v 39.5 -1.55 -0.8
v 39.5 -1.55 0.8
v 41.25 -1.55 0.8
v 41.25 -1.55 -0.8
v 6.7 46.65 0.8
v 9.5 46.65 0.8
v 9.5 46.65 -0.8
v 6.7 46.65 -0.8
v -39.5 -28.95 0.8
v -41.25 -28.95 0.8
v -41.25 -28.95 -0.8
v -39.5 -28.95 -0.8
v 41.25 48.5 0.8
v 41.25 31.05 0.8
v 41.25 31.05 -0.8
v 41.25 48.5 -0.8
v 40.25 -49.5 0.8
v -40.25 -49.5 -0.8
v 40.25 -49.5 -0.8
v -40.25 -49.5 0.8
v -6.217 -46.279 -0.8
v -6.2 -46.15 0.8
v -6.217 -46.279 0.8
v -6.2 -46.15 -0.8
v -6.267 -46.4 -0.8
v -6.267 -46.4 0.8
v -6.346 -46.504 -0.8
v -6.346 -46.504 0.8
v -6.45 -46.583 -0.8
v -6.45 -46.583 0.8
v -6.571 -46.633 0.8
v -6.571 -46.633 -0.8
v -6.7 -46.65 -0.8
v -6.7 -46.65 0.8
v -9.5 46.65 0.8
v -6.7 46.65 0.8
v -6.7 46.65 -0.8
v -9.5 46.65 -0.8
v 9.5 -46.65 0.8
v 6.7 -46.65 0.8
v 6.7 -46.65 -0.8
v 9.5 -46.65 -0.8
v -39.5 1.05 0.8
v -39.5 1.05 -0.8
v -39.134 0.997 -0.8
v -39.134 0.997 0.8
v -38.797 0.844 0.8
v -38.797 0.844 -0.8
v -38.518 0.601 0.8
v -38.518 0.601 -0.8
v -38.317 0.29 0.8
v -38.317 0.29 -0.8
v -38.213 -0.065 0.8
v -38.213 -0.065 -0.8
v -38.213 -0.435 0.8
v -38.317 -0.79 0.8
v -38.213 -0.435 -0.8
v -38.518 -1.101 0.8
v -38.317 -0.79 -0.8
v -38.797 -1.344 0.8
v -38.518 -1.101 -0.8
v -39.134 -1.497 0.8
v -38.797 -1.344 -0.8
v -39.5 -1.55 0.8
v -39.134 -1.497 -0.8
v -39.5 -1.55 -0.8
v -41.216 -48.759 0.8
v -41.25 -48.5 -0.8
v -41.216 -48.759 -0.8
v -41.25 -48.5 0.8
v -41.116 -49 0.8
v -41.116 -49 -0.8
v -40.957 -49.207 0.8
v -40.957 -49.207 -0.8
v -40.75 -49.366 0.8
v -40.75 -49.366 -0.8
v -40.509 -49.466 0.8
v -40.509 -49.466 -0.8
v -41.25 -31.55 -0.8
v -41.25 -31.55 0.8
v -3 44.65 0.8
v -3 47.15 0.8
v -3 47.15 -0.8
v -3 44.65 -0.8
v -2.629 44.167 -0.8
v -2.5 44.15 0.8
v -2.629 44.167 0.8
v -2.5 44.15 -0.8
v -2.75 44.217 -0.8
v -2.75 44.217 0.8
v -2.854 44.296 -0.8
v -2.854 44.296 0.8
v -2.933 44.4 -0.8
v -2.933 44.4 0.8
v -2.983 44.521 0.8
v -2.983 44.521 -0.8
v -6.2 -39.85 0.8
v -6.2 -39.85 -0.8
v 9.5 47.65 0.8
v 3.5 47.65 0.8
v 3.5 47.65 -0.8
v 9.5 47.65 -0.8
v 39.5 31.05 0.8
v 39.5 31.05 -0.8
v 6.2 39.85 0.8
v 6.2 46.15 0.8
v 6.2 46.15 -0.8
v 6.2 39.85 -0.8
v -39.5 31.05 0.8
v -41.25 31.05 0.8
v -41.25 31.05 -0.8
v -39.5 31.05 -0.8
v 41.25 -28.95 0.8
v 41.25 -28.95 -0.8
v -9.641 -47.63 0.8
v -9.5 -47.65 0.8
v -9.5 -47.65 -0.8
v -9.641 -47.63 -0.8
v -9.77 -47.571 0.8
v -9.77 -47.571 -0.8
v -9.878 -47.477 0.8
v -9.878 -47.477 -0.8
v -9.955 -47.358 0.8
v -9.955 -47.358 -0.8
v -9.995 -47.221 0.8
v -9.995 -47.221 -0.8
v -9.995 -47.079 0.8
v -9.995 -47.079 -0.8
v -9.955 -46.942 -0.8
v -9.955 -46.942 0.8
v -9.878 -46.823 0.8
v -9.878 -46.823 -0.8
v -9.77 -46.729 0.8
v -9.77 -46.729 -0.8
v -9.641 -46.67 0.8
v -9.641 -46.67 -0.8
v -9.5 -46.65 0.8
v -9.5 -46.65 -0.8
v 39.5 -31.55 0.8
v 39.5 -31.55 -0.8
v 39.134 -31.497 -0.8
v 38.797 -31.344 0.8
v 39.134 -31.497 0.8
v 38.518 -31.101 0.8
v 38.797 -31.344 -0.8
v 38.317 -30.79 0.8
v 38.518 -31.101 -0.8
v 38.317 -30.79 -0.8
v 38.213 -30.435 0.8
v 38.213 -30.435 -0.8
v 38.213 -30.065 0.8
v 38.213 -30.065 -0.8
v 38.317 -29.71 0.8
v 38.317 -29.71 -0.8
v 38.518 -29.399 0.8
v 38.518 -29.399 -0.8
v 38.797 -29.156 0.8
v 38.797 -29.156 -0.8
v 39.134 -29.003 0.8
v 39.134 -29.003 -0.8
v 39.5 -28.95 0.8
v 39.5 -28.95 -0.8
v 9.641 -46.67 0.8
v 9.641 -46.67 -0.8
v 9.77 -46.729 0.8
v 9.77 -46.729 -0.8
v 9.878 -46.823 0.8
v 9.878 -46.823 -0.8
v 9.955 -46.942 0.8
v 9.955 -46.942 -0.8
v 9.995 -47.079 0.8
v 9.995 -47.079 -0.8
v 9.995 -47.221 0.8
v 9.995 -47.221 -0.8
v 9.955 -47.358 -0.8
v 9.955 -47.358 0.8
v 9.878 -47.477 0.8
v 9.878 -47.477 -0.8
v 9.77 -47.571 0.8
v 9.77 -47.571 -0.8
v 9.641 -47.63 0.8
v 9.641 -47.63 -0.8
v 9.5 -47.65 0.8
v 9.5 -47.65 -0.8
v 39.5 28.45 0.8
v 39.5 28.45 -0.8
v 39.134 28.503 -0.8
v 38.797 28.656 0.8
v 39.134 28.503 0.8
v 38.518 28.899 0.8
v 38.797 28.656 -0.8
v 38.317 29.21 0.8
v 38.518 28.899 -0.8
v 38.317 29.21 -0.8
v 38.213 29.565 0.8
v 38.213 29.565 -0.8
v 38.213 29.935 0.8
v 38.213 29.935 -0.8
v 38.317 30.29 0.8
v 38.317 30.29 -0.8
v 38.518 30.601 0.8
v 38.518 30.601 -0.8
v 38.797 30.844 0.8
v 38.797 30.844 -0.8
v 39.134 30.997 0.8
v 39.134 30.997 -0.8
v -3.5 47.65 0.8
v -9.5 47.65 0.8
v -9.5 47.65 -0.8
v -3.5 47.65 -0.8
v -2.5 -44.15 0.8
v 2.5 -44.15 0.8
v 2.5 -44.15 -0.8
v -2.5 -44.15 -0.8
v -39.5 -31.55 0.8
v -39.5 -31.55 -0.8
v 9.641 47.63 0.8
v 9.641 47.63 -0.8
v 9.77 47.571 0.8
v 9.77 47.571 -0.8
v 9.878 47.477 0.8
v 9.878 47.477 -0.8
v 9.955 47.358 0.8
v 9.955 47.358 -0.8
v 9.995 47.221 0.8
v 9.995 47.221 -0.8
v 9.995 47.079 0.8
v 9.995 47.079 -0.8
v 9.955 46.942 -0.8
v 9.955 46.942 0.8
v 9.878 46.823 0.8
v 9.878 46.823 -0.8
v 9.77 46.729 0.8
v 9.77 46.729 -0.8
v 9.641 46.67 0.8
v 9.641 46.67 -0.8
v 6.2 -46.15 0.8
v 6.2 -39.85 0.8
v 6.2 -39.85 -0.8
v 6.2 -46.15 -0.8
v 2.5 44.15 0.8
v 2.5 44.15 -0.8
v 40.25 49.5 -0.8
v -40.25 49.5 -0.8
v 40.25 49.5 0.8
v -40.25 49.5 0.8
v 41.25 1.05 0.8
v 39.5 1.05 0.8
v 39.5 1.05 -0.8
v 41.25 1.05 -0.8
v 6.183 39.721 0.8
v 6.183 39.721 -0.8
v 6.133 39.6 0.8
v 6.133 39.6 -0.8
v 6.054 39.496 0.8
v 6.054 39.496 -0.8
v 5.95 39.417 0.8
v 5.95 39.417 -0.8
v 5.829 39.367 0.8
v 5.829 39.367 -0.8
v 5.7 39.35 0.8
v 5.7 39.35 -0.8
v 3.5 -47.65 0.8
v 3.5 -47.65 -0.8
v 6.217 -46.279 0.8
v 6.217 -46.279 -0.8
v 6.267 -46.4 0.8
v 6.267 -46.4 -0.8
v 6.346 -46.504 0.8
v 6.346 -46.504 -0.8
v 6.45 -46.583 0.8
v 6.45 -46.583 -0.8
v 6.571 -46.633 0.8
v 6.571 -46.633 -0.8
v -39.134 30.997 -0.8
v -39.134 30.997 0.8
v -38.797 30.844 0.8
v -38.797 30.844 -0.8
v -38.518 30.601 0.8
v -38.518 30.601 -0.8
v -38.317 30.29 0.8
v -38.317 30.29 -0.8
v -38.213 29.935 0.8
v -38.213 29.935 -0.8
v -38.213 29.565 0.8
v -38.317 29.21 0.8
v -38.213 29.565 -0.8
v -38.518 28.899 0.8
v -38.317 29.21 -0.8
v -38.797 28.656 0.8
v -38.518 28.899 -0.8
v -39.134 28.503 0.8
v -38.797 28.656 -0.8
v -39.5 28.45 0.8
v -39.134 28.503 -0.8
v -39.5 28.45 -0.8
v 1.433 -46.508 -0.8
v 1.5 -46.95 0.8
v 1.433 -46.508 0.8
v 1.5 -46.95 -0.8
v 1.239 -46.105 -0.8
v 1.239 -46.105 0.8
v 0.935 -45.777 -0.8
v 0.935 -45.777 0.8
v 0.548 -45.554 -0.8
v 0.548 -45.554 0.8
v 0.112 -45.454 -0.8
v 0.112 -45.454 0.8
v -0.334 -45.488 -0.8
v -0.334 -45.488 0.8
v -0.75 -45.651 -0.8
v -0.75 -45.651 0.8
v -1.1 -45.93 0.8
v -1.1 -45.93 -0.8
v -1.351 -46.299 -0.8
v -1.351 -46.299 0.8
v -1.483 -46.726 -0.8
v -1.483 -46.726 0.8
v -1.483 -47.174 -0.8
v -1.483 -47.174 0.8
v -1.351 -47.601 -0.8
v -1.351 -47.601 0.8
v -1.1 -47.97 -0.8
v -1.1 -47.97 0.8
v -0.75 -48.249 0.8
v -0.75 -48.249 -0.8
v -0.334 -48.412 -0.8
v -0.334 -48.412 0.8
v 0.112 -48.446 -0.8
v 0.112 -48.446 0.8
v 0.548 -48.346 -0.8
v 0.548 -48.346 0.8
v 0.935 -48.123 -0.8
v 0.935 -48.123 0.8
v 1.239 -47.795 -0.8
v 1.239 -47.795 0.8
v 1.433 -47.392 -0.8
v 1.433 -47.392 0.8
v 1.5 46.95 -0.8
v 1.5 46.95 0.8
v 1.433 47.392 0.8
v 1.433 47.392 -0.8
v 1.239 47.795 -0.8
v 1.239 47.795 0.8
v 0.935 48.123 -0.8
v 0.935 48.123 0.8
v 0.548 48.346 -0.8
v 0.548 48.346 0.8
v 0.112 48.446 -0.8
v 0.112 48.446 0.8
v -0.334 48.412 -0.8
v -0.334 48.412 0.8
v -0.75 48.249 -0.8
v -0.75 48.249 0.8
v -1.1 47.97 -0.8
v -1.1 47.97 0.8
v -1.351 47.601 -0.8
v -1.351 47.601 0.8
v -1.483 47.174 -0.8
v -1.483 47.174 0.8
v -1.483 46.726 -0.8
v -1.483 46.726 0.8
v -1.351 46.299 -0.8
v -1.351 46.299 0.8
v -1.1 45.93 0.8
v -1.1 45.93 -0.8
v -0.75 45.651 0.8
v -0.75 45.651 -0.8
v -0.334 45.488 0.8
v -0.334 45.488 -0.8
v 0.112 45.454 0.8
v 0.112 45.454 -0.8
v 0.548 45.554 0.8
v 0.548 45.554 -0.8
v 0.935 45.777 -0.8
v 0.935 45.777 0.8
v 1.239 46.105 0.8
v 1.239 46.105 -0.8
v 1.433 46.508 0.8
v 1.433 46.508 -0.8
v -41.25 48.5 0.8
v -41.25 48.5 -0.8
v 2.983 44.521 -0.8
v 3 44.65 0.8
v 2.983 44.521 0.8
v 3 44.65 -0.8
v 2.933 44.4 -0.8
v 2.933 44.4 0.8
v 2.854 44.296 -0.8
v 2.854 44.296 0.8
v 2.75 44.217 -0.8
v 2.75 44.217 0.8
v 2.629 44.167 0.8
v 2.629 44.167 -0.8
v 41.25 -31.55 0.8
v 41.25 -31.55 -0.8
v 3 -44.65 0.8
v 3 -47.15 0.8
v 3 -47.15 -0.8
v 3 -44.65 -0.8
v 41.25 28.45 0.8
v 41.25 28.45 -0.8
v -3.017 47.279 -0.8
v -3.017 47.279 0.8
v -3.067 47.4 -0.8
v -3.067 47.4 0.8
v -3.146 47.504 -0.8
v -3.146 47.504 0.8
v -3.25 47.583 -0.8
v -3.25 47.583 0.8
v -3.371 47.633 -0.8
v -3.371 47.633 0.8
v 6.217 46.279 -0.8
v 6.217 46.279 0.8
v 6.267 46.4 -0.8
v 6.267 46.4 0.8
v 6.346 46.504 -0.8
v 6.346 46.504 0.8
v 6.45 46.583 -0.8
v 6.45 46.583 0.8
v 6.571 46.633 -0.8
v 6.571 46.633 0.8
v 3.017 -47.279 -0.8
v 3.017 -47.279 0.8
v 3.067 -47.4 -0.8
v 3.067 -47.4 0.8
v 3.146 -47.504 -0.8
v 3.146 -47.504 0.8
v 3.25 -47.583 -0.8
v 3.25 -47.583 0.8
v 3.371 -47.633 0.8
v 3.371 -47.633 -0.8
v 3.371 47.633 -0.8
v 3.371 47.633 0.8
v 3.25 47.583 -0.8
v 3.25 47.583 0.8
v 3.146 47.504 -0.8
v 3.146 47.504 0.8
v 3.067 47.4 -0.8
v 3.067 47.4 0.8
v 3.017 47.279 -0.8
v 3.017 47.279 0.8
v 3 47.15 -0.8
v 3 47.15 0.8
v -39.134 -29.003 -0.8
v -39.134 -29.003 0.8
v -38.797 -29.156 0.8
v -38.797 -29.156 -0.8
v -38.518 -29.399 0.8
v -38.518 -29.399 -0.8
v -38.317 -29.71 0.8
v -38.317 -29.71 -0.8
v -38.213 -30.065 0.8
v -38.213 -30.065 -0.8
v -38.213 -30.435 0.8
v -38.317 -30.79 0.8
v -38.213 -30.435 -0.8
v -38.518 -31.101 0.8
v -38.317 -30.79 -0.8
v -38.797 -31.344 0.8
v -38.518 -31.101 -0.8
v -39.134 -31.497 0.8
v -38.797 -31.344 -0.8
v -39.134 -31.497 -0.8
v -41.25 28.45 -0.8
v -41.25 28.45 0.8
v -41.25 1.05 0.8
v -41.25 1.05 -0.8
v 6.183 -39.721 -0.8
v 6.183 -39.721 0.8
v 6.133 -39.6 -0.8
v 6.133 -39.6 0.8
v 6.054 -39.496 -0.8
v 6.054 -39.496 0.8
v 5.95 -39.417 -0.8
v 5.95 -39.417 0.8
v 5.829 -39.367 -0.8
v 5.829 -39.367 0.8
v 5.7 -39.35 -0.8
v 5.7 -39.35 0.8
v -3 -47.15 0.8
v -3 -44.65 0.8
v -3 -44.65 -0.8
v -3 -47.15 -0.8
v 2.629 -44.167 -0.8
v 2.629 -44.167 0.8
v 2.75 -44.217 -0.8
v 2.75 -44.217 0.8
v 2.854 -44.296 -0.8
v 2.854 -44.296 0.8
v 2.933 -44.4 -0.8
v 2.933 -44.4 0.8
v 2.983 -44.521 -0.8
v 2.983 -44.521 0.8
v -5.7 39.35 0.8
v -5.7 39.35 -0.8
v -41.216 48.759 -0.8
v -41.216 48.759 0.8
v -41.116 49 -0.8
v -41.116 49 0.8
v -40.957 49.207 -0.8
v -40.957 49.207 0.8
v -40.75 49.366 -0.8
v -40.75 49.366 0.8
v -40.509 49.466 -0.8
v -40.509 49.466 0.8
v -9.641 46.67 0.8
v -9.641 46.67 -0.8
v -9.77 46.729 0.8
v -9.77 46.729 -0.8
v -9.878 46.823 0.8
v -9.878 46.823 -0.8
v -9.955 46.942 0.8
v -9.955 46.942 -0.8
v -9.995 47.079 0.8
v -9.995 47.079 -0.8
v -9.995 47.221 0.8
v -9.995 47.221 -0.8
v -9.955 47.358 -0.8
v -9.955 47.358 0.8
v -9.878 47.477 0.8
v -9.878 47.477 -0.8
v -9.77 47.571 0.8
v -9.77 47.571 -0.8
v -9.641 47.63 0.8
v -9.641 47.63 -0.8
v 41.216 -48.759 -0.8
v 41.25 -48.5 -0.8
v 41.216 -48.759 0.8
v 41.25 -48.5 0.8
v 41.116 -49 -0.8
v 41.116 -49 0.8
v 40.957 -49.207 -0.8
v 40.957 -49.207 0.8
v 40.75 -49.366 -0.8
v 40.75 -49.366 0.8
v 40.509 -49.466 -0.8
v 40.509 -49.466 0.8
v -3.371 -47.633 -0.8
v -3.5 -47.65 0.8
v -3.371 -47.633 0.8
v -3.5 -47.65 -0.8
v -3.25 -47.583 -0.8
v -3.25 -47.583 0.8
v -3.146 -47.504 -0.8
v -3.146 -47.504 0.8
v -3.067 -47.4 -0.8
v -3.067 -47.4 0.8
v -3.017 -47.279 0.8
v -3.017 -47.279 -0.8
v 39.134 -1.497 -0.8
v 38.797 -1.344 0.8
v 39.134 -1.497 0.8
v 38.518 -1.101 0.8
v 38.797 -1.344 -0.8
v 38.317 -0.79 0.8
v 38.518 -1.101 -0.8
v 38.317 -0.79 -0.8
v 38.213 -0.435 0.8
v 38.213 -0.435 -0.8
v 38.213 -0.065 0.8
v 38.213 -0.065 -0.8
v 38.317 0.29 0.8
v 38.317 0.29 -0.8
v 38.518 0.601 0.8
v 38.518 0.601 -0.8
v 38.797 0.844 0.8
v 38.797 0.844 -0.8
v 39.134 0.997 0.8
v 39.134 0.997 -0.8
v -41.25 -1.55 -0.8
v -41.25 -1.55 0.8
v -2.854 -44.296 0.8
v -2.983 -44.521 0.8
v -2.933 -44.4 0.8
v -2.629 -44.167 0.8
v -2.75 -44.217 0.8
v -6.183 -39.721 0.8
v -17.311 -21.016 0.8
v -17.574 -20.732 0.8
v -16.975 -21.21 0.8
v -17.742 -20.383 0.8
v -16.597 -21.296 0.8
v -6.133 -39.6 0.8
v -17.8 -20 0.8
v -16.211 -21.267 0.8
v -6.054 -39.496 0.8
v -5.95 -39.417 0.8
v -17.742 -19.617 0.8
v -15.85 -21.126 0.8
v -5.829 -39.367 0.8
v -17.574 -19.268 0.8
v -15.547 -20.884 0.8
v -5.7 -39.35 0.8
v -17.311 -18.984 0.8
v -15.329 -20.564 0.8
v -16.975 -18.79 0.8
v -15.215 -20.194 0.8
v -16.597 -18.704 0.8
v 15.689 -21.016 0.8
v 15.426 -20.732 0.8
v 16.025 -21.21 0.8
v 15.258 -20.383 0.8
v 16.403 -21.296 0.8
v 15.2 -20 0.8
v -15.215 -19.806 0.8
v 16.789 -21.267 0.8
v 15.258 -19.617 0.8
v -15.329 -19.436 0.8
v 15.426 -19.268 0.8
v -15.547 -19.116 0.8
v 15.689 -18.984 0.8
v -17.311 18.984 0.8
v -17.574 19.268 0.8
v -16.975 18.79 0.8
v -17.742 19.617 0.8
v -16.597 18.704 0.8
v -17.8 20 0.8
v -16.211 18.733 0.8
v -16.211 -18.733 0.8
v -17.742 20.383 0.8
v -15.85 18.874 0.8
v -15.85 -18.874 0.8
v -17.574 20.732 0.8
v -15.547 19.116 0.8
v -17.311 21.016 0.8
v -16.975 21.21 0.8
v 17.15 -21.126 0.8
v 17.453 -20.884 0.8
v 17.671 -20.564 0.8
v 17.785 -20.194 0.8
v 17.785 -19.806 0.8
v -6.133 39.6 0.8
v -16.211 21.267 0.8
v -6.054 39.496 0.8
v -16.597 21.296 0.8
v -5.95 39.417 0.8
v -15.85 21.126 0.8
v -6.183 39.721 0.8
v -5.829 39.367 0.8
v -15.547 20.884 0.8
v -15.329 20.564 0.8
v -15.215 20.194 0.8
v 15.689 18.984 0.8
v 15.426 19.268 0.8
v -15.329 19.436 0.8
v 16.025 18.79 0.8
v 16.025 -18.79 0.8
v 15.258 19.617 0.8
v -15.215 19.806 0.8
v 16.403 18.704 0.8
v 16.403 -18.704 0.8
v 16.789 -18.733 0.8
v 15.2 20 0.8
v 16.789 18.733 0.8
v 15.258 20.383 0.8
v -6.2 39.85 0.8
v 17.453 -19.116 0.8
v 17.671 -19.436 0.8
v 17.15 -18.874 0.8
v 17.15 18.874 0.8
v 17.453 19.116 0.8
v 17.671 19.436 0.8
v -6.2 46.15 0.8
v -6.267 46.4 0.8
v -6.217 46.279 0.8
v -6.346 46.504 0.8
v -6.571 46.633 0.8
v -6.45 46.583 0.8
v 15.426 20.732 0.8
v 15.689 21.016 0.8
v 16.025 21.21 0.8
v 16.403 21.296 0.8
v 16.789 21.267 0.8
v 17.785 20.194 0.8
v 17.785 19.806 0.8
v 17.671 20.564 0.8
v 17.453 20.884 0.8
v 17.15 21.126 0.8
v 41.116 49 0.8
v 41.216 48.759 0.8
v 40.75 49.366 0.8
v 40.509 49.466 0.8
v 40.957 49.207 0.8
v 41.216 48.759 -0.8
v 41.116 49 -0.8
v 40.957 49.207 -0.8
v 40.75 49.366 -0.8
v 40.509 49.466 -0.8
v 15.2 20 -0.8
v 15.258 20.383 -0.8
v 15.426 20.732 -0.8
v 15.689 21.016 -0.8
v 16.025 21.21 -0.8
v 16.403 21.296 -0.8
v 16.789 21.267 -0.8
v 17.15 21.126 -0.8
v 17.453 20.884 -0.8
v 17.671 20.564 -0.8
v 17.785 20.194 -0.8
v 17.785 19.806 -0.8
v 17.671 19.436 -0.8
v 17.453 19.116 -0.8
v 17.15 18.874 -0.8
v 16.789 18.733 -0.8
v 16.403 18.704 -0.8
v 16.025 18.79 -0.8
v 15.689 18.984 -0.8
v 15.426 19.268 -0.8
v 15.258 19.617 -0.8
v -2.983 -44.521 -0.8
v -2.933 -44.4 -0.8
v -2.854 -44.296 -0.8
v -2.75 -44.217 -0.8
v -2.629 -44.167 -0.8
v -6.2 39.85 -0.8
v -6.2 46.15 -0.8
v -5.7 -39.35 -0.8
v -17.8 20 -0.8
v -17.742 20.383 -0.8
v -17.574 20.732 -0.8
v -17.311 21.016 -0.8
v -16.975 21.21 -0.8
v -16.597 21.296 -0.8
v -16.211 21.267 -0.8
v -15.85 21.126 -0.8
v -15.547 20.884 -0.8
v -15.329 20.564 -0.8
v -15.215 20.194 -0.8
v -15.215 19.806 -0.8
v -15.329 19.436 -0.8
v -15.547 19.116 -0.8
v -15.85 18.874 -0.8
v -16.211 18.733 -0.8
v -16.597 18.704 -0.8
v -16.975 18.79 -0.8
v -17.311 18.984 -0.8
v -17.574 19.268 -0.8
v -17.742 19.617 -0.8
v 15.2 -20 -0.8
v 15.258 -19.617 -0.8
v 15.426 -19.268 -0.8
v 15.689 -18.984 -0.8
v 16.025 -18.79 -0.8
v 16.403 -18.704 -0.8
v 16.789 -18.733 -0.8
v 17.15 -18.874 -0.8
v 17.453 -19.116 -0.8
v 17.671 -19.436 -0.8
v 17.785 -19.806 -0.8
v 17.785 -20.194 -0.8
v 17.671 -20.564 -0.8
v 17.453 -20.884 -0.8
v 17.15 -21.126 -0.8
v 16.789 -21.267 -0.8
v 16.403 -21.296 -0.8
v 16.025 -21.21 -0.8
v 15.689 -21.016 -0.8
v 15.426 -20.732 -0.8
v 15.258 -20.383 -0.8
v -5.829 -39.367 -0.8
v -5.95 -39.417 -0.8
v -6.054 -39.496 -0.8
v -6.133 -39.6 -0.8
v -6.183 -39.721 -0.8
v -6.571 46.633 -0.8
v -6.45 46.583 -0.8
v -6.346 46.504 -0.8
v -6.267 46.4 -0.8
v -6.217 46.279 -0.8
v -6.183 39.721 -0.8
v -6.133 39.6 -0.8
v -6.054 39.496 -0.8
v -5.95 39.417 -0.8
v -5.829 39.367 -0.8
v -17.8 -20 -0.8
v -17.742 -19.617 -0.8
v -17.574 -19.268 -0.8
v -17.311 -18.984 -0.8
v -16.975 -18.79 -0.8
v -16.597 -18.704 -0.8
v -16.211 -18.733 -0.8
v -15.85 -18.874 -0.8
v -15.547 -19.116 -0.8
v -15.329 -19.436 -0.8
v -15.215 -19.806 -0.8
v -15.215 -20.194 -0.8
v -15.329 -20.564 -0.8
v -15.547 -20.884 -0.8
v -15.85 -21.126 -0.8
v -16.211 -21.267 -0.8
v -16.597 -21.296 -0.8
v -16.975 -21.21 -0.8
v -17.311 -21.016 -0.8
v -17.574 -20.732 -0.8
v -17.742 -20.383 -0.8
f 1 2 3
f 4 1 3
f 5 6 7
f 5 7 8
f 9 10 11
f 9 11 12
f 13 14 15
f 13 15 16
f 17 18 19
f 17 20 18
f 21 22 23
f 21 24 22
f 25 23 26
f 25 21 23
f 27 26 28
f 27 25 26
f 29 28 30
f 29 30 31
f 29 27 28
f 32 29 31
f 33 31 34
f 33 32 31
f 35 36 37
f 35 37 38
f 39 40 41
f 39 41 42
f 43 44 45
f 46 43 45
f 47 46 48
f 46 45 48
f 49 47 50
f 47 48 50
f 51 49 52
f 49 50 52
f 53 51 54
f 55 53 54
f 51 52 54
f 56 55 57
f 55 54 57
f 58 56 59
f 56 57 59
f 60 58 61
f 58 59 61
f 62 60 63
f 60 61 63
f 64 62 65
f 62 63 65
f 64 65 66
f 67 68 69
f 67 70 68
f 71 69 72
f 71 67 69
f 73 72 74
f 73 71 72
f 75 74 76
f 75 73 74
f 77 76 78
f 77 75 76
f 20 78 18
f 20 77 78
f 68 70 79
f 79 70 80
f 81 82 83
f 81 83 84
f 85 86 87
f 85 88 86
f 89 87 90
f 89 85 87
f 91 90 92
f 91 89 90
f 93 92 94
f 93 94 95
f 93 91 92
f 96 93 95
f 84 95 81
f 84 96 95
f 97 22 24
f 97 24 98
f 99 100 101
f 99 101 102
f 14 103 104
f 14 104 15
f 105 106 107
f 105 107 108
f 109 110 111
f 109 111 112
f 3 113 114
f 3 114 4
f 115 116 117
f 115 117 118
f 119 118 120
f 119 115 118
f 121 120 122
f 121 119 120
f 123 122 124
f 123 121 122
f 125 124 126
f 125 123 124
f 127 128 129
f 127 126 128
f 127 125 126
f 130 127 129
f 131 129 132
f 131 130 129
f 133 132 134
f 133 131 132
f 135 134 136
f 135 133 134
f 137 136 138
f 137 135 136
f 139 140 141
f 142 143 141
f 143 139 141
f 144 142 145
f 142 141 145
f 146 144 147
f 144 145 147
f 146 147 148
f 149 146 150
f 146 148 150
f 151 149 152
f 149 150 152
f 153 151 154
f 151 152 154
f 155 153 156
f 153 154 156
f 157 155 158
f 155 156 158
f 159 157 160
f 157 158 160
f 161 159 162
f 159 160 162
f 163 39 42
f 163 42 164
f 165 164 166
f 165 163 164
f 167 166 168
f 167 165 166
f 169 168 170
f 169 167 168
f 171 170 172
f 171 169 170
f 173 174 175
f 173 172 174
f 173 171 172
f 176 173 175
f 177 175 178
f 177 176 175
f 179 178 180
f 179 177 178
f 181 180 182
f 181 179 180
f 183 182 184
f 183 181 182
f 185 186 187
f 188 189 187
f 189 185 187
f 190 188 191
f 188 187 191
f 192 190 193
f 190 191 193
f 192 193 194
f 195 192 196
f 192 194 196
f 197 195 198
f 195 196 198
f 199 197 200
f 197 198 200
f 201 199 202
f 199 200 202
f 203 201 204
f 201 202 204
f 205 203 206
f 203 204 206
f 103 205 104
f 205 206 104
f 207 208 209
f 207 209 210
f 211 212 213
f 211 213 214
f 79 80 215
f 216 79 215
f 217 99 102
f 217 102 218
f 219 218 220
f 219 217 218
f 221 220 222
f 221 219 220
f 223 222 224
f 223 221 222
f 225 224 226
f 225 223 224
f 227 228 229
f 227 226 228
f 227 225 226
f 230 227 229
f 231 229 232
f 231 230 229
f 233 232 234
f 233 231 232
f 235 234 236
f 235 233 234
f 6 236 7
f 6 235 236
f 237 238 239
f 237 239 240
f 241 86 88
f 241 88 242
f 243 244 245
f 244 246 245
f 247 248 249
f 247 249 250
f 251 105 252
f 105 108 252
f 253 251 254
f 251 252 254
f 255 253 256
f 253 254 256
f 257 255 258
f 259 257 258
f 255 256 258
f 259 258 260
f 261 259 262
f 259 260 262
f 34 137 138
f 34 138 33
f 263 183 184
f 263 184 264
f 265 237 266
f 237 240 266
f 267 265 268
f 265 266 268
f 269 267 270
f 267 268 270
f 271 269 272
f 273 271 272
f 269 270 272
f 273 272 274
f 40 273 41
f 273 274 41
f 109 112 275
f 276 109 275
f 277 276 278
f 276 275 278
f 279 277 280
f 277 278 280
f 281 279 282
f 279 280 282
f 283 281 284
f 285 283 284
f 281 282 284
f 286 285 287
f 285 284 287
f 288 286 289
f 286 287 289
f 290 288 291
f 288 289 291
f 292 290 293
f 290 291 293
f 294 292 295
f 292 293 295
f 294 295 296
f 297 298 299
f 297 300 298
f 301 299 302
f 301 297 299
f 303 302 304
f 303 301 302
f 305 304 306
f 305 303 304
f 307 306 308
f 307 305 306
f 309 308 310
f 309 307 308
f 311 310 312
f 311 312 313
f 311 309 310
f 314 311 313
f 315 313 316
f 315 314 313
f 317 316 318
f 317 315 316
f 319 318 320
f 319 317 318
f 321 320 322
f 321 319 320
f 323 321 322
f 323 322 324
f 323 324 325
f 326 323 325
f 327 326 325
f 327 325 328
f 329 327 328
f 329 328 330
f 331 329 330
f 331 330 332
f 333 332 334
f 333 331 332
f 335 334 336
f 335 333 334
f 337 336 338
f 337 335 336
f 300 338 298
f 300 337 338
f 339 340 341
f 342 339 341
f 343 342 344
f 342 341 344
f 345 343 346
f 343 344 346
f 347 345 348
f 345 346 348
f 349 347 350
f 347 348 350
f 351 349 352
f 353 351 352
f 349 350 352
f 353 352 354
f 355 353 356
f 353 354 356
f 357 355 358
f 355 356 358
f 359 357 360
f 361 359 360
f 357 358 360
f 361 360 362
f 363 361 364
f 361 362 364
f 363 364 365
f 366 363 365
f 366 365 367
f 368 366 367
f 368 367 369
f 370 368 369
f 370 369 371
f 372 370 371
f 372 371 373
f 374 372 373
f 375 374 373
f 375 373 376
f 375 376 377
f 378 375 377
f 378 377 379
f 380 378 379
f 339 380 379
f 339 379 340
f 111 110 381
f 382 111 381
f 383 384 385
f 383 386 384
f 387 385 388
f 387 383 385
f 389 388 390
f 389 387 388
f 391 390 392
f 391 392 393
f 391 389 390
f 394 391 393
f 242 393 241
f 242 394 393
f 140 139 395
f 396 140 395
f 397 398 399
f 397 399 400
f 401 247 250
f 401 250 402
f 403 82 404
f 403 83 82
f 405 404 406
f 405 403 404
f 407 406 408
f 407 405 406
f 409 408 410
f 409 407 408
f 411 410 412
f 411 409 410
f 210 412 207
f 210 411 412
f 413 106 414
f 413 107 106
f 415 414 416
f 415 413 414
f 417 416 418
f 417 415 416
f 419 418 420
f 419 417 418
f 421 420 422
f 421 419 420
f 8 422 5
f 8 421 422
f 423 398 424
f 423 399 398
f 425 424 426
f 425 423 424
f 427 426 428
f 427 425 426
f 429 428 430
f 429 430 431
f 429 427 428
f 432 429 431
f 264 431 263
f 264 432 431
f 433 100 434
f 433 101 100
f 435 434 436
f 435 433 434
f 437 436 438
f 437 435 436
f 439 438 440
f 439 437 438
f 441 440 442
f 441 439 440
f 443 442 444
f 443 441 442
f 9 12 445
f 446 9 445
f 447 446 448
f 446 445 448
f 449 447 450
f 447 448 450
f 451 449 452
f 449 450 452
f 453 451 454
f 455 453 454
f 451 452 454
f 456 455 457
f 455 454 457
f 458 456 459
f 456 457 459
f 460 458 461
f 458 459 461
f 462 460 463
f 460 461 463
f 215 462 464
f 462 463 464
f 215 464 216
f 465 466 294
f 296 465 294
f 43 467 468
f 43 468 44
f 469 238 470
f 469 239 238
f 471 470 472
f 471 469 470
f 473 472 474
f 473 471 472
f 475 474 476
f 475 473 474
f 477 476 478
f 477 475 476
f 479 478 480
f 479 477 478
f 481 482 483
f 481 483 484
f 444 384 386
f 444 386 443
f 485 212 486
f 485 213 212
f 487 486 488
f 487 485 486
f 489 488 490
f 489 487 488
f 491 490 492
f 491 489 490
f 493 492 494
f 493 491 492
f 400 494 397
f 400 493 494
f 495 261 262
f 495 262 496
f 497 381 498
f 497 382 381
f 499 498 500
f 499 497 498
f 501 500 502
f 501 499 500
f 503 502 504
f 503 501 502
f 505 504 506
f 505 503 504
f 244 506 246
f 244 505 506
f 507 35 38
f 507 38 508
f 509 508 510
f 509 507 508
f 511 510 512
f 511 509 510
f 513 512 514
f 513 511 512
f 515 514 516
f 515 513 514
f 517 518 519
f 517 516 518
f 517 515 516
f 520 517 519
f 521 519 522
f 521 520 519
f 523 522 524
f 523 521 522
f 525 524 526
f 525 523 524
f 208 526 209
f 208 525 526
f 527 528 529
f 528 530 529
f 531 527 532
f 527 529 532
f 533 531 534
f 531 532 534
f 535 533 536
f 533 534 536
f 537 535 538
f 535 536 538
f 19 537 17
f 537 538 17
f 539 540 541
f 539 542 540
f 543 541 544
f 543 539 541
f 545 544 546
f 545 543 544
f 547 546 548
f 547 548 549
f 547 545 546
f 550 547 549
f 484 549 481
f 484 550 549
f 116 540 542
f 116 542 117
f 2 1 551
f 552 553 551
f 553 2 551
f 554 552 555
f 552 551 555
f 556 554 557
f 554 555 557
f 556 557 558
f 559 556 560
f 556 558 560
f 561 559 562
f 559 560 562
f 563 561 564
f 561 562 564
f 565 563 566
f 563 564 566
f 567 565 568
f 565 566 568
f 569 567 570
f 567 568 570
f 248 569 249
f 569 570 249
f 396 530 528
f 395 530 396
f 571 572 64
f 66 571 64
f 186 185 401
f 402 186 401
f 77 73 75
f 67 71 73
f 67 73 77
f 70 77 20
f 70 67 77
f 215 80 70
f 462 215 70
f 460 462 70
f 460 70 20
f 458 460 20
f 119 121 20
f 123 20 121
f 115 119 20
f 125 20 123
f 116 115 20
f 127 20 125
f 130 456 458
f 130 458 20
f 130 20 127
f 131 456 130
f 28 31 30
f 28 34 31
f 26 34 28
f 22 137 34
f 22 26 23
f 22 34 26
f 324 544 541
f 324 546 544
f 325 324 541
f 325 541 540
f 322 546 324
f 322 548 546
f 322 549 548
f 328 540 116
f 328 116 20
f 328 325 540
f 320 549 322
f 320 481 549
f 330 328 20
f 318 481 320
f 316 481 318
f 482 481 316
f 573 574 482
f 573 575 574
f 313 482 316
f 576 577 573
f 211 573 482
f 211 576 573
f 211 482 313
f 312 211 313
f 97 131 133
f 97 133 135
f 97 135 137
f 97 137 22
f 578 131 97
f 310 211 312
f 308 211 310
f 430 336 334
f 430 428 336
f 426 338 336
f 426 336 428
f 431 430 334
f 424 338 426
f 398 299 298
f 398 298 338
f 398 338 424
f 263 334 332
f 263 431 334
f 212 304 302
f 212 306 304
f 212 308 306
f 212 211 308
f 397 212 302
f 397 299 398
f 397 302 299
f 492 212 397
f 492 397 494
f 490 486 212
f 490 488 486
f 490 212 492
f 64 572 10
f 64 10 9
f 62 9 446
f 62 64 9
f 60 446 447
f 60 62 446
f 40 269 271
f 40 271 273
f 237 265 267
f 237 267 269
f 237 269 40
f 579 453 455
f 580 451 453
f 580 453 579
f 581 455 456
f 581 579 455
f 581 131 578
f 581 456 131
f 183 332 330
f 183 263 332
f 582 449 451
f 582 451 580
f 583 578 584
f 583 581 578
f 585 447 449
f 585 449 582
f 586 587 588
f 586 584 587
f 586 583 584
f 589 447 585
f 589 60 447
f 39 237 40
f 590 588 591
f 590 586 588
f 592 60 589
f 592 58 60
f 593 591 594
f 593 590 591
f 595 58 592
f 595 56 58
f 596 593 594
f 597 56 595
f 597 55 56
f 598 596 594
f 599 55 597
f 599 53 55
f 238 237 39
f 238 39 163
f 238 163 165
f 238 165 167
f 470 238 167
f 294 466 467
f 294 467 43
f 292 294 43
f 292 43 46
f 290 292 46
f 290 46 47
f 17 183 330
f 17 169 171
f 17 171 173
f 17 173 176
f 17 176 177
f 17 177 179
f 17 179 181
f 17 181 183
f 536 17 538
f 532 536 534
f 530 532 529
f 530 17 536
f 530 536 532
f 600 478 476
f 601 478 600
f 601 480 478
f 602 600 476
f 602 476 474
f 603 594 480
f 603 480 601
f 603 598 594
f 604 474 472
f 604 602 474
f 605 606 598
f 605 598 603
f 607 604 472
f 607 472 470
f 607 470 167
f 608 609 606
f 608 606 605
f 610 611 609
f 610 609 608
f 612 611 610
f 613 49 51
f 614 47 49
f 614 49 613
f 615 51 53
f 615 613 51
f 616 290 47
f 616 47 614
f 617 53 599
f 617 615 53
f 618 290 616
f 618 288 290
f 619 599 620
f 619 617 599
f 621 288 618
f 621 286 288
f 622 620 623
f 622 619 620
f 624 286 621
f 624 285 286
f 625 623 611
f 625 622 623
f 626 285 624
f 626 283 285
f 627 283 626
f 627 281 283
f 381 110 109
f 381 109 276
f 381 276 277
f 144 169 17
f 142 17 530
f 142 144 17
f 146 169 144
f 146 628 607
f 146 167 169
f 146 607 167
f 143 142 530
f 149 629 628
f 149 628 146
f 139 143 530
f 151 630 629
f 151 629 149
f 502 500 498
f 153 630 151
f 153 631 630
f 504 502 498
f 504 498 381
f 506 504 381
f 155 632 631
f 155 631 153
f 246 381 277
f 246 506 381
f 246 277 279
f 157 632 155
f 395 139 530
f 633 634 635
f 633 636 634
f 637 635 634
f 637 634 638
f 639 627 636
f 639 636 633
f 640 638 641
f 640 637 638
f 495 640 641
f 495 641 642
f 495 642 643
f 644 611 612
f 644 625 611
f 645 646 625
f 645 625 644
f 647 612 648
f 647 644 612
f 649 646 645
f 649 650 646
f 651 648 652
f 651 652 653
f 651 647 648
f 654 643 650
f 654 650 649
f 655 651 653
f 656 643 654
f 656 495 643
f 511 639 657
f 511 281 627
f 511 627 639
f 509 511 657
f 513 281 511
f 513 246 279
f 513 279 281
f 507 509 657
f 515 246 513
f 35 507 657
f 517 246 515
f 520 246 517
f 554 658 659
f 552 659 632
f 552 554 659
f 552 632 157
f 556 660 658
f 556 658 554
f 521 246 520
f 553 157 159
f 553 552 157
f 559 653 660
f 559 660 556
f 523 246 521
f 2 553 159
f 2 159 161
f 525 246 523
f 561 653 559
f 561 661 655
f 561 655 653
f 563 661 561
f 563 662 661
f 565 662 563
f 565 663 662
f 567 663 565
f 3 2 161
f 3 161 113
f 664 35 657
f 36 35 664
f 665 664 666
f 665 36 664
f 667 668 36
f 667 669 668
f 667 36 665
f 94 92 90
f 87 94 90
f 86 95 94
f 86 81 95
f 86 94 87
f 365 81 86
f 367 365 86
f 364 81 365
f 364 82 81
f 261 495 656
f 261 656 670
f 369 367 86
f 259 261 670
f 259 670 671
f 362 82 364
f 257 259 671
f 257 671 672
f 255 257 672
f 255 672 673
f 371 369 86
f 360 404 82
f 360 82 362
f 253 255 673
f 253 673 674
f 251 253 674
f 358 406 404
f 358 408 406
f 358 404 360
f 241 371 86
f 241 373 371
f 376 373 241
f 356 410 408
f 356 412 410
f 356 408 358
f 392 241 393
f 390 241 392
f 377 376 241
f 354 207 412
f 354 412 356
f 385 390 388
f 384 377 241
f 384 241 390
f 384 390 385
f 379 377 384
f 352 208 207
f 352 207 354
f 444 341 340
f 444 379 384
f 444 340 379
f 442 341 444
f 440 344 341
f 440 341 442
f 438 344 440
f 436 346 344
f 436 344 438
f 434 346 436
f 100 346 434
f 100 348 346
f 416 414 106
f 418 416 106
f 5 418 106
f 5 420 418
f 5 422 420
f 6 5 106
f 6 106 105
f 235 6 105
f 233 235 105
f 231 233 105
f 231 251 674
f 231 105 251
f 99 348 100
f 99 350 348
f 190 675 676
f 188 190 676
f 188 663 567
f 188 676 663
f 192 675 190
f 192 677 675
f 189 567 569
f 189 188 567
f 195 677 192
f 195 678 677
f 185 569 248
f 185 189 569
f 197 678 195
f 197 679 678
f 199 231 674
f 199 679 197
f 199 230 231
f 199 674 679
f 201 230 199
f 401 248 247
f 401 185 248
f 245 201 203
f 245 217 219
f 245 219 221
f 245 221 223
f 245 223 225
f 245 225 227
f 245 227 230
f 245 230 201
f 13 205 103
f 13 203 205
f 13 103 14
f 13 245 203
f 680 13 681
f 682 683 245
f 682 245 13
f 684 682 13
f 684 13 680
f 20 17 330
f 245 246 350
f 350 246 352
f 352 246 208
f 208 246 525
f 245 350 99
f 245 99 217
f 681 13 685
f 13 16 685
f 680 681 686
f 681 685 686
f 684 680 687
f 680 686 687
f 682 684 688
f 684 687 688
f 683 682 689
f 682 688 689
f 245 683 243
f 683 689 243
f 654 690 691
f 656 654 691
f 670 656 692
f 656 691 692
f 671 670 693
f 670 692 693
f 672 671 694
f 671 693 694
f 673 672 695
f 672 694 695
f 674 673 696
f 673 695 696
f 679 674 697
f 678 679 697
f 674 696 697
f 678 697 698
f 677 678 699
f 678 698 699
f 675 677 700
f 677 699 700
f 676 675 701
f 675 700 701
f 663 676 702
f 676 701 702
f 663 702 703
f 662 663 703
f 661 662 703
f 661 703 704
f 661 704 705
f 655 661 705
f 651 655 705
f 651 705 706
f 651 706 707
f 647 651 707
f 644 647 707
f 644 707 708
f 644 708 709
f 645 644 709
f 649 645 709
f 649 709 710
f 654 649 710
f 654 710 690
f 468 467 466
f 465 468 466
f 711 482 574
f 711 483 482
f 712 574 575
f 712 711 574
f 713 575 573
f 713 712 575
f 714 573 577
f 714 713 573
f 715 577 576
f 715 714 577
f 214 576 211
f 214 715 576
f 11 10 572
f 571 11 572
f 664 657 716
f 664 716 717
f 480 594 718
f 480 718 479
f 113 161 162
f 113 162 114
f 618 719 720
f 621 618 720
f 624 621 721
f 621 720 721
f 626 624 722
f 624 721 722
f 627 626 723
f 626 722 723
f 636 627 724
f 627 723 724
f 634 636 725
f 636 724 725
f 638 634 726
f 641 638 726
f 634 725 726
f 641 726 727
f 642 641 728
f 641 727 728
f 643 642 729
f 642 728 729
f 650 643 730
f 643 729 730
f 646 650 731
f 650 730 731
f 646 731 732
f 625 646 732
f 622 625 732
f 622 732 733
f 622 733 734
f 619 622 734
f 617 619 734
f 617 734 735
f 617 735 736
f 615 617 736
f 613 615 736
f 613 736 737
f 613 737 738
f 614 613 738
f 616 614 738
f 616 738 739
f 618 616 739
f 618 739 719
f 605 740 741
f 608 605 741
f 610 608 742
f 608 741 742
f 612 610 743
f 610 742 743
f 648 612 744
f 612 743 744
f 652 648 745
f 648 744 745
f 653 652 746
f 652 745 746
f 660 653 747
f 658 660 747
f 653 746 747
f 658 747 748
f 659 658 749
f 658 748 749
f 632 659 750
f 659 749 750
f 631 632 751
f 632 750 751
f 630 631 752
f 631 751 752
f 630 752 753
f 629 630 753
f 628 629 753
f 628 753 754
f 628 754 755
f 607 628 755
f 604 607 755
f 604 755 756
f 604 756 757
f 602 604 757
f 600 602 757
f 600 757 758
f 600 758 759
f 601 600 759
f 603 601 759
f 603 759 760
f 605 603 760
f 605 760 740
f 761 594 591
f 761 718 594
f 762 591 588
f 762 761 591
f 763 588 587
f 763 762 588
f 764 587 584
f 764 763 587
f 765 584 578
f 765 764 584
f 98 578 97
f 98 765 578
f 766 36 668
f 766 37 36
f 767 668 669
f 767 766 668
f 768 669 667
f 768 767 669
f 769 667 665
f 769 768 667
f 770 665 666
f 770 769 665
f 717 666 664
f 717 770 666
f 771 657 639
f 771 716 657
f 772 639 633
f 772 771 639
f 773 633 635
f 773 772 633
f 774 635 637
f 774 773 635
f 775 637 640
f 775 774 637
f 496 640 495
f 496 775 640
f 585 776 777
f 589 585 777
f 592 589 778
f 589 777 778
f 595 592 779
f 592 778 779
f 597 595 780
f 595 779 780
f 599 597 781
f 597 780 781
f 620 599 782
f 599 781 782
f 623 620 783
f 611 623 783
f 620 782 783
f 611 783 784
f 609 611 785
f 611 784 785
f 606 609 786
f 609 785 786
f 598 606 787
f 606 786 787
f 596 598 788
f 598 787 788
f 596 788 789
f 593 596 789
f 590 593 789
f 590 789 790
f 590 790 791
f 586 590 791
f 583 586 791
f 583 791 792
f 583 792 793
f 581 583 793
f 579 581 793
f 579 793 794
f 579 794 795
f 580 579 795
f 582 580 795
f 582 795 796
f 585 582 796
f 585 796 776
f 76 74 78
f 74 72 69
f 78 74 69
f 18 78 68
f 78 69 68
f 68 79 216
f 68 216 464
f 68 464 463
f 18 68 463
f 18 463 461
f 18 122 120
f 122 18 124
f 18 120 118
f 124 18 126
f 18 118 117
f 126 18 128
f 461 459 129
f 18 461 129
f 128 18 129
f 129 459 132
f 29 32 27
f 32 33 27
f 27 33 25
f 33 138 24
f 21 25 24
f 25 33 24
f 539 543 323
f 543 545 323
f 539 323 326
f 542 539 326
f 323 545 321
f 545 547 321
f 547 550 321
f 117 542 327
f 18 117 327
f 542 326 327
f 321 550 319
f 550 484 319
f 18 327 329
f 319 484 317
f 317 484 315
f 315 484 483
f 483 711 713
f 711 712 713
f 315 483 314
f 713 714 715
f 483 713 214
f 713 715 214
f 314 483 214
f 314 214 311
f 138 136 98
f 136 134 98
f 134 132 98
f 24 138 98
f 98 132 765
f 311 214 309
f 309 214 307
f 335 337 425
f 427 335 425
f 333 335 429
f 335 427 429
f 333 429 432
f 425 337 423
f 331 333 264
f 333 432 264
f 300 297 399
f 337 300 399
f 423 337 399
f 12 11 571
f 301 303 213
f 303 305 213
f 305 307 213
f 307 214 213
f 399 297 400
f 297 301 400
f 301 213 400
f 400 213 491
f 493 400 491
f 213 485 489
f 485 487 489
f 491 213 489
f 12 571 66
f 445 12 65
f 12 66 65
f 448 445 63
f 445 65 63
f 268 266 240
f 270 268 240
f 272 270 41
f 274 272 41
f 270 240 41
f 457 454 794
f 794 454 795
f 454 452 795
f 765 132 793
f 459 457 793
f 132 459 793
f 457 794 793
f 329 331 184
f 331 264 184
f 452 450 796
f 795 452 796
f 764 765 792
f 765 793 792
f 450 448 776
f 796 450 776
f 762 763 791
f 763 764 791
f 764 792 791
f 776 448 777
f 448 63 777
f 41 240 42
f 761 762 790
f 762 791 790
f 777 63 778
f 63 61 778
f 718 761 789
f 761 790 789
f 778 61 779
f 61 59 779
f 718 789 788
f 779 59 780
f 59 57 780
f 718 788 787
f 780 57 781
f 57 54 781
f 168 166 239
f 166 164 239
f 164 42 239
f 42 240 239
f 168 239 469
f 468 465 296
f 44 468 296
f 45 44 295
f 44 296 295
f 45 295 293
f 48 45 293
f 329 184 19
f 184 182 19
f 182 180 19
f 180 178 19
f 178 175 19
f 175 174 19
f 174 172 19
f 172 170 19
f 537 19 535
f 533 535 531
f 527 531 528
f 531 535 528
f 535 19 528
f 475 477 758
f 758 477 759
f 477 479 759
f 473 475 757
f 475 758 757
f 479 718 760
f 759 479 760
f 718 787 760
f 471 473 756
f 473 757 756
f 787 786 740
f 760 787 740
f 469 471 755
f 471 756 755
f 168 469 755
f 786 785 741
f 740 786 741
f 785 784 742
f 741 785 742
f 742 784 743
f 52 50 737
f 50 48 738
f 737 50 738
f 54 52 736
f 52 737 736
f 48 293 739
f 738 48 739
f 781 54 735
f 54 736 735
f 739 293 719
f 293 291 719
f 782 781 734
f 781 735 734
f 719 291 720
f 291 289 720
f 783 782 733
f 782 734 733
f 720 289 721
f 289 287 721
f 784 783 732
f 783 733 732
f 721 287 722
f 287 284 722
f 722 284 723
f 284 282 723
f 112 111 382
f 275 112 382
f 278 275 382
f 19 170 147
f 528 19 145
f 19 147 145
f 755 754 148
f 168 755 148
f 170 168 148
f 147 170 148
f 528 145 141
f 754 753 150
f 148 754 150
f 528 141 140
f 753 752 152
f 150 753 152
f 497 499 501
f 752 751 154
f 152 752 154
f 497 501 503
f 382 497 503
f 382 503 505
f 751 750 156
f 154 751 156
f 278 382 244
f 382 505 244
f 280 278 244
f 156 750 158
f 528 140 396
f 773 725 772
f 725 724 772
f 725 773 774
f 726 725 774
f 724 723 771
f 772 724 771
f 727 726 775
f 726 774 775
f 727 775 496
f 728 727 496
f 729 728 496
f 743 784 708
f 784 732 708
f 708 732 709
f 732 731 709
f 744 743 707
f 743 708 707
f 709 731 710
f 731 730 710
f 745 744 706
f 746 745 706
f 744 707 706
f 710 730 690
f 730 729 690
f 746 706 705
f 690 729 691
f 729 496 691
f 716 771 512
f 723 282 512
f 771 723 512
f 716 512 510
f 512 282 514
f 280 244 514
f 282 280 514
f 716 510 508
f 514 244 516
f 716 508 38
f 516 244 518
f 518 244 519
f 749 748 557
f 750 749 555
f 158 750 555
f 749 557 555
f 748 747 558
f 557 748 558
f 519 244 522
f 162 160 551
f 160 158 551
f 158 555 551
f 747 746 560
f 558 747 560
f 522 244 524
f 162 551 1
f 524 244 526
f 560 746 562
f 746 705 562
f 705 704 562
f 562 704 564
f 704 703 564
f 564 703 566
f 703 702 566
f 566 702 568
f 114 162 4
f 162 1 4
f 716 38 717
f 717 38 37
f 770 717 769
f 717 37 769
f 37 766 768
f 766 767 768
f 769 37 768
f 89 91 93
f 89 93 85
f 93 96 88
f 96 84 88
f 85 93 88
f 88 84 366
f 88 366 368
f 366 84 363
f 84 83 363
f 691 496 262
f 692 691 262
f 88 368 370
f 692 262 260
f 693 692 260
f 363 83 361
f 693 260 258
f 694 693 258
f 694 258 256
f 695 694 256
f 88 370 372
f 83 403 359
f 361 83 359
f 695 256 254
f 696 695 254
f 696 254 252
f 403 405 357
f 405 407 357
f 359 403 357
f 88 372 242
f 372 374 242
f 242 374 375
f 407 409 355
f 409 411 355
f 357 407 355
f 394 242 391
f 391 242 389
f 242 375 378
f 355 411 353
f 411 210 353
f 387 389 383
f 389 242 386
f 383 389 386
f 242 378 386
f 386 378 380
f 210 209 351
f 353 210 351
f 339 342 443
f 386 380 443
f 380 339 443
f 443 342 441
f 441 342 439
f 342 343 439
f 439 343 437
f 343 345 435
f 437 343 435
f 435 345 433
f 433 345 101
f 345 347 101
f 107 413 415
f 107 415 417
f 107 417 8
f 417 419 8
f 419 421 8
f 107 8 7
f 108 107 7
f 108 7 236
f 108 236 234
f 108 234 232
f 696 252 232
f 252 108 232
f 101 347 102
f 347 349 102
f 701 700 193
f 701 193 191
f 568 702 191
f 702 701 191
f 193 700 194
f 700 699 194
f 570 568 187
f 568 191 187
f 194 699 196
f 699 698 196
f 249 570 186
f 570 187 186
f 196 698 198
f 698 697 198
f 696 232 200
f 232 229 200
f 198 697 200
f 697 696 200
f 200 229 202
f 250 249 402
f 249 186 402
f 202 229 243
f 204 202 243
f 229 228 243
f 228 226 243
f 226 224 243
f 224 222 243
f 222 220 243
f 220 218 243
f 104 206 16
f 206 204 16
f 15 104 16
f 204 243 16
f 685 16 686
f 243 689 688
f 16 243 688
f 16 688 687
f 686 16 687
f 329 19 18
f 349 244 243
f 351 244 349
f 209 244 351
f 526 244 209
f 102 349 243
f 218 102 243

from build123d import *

# Parameters (mm, degrees)
SKETCH2_W            = 82.5
SKETCH2_H            = 99
SKETCH2_R            = 0.8
SKETCH2_R_2          = 1.5
PCB_EXTRUDE_DEPTH    = 0.8
CORNER_FILLETS_R     = 1
SKETCH4_R            = 1.5
SOLAR_HOLES_DEPTH    = 2.6
SOLAR_HOLE_FILLETS_R = 0.5
M2_CLEARANCE_HOLES_D = 2.6
SKETCH10_W           = 1.75
SKETCH10_H           = 2.6
CUT_EXTRUDE2_DEPTH   = 2.6


with BuildPart() as part:
    # Sketch2 → pcb extrude (new body, symmetric)
    with BuildSketch(Plane.XY):
        Rectangle(SKETCH2_W, SKETCH2_H)
        with Locations((0, 46.95)):
            Circle(SKETCH2_R, mode=Mode.SUBTRACT)
        with Locations((-39.5, -30.25)):
            Circle(SKETCH2_R, mode=Mode.SUBTRACT)
        with Locations((-39.5, -0.25)):
            Circle(SKETCH2_R, mode=Mode.SUBTRACT)
        with Locations((-39.5, 29.75)):
            Circle(SKETCH2_R, mode=Mode.SUBTRACT)
        with Locations((39.5, -30.25)):
            Circle(SKETCH2_R, mode=Mode.SUBTRACT)
        with Locations((39.5, -0.25)):
            Circle(SKETCH2_R, mode=Mode.SUBTRACT)
        with Locations((39.5, 29.75)):
            Circle(SKETCH2_R, mode=Mode.SUBTRACT)
        with Locations((0, -46.95)):
            Circle(SKETCH2_R_2, mode=Mode.SUBTRACT)
        with Locations((-16.5, 20)):
            Circle(SKETCH2_R, mode=Mode.SUBTRACT)
        with Locations((16.5, 20)):
            Circle(SKETCH2_R, mode=Mode.SUBTRACT)
        with Locations((-16.5, -20)):
            Circle(SKETCH2_R, mode=Mode.SUBTRACT)
        with Locations((16.5, -20)):
            Circle(SKETCH2_R, mode=Mode.SUBTRACT)
    extrude(amount=PCB_EXTRUDE_DEPTH, both=True)

    # corner fillets
    corner_fillets_edges = [part.edges().sort_by_distance(p)[0] for p in [
        (41.25, 49.5, 0),
        (41.25, -49.5, 0),
        (-41.25, -49.5, 0),
        (-41.25, 49.5, 0),
    ]]
    fillet(corner_fillets_edges, radius=CORNER_FILLETS_R)

    # Sketch4 → solar holes (cut, through all)
    with BuildSketch(Plane.XY.offset(0.8)):
        with Locations((0, 46.95)):
            Circle(SKETCH4_R)
        with BuildLine():
            Line((6.2, 39.35), (-6.2, 39.35))
            Line((-6.2, 39.35), (-6.2, 46.65))
            Line((-6.2, 46.65), (-9.5, 46.65))
            ThreePointArc((-9.5, 46.65), (-10, 47.15), (-9.5, 47.65))
            Line((-9.5, 47.65), (-3, 47.65))
            Line((-3, 47.65), (-3, 44.15))
            Line((-3, 44.15), (3, 44.15))
            Line((3, 44.15), (3, 47.65))
            Line((3, 47.65), (9.5, 47.65))
            ThreePointArc((9.5, 47.65), (10, 47.15), (9.5, 46.65))
            Line((9.5, 46.65), (6.2, 46.65))
            Line((6.2, 46.65), (6.2, 39.35))
        make_face()
        with BuildLine():
            Line((6.2, -46.65), (9.5, -46.65))
            ThreePointArc((9.5, -46.65), (10, -47.15), (9.5, -47.65))
            Line((9.5, -47.65), (3, -47.65))
            Line((3, -47.65), (3, -44.15))
            Line((3, -44.15), (-3, -44.15))
            Line((-3, -44.15), (-3, -47.65))
            Line((-3, -47.65), (-9.5, -47.65))
            ThreePointArc((-9.5, -47.65), (-10, -47.15), (-9.5, -46.65))
            Line((-9.5, -46.65), (-6.2, -46.65))
            Line((-6.2, -46.65), (-6.2, -39.35))
            Line((-6.2, -39.35), (6.2, -39.35))
            Line((6.2, -39.35), (6.2, -46.65))
        make_face()
    extrude(amount=-SOLAR_HOLES_DEPTH, mode=Mode.SUBTRACT)

    # solar hole fillets
    solar_hole_fillets_edges = [part.edges().sort_by_distance(p)[0] for p in [
        (3, -47.65, 0),
        (3, -44.15, 0),
        (-3, -44.15, 0),
        (-3, -47.65, 0),
        (-6.2, -46.65, 0),
        (-6.2, -39.35, 0),
        (-6.2, 39.35, 0),
        (-6.2, 46.65, 0),
        (-3, 47.65, 0),
        (-3, 44.15, 0),
        (3, 44.15, 0),
        (3, 47.65, 0),
        (6.2, 46.65, 0),
        (6.2, 39.35, 0),
        (6.2, -39.35, 0),
        (6.2, -46.65, 0),
    ]]
    fillet(solar_hole_fillets_edges, radius=SOLAR_HOLE_FILLETS_R)

    # M2 Clearance Holes (through all)
    with Locations(Plane.XY.offset(0.8)):
        with Locations((-39.5, 29.75), (-39.5, -0.25), (-16.5, 20), (16.5, 20), (16.5, -20), (-16.5, -20), (39.5, 29.75), (39.5, -0.25), (39.5, -30.25), (-39.5, -30.25)):
            Hole(M2_CLEARANCE_HOLES_D / 2)

    # Sketch10 → Cut-Extrude2 (cut, through all)
    with BuildSketch(Plane.XY.offset(0.8)):
        with Locations((-40.375, 29.75)):
            Rectangle(SKETCH10_W, SKETCH10_H)
        with Locations((-40.375, -0.25)):
            Rectangle(SKETCH10_W, SKETCH10_H)
        with Locations((-40.375, -30.25)):
            Rectangle(SKETCH10_W, SKETCH10_H)
        with Locations((40.375, -30.25)):
            Rectangle(SKETCH10_W, SKETCH10_H)
        with Locations((40.375, -0.25)):
            Rectangle(SKETCH10_W, SKETCH10_H)
        with Locations((40.375, 29.75)):
            Rectangle(SKETCH10_W, SKETCH10_H)
    extrude(amount=-CUT_EXTRUDE2_DEPTH, mode=Mode.SUBTRACT)


solid = part.part
